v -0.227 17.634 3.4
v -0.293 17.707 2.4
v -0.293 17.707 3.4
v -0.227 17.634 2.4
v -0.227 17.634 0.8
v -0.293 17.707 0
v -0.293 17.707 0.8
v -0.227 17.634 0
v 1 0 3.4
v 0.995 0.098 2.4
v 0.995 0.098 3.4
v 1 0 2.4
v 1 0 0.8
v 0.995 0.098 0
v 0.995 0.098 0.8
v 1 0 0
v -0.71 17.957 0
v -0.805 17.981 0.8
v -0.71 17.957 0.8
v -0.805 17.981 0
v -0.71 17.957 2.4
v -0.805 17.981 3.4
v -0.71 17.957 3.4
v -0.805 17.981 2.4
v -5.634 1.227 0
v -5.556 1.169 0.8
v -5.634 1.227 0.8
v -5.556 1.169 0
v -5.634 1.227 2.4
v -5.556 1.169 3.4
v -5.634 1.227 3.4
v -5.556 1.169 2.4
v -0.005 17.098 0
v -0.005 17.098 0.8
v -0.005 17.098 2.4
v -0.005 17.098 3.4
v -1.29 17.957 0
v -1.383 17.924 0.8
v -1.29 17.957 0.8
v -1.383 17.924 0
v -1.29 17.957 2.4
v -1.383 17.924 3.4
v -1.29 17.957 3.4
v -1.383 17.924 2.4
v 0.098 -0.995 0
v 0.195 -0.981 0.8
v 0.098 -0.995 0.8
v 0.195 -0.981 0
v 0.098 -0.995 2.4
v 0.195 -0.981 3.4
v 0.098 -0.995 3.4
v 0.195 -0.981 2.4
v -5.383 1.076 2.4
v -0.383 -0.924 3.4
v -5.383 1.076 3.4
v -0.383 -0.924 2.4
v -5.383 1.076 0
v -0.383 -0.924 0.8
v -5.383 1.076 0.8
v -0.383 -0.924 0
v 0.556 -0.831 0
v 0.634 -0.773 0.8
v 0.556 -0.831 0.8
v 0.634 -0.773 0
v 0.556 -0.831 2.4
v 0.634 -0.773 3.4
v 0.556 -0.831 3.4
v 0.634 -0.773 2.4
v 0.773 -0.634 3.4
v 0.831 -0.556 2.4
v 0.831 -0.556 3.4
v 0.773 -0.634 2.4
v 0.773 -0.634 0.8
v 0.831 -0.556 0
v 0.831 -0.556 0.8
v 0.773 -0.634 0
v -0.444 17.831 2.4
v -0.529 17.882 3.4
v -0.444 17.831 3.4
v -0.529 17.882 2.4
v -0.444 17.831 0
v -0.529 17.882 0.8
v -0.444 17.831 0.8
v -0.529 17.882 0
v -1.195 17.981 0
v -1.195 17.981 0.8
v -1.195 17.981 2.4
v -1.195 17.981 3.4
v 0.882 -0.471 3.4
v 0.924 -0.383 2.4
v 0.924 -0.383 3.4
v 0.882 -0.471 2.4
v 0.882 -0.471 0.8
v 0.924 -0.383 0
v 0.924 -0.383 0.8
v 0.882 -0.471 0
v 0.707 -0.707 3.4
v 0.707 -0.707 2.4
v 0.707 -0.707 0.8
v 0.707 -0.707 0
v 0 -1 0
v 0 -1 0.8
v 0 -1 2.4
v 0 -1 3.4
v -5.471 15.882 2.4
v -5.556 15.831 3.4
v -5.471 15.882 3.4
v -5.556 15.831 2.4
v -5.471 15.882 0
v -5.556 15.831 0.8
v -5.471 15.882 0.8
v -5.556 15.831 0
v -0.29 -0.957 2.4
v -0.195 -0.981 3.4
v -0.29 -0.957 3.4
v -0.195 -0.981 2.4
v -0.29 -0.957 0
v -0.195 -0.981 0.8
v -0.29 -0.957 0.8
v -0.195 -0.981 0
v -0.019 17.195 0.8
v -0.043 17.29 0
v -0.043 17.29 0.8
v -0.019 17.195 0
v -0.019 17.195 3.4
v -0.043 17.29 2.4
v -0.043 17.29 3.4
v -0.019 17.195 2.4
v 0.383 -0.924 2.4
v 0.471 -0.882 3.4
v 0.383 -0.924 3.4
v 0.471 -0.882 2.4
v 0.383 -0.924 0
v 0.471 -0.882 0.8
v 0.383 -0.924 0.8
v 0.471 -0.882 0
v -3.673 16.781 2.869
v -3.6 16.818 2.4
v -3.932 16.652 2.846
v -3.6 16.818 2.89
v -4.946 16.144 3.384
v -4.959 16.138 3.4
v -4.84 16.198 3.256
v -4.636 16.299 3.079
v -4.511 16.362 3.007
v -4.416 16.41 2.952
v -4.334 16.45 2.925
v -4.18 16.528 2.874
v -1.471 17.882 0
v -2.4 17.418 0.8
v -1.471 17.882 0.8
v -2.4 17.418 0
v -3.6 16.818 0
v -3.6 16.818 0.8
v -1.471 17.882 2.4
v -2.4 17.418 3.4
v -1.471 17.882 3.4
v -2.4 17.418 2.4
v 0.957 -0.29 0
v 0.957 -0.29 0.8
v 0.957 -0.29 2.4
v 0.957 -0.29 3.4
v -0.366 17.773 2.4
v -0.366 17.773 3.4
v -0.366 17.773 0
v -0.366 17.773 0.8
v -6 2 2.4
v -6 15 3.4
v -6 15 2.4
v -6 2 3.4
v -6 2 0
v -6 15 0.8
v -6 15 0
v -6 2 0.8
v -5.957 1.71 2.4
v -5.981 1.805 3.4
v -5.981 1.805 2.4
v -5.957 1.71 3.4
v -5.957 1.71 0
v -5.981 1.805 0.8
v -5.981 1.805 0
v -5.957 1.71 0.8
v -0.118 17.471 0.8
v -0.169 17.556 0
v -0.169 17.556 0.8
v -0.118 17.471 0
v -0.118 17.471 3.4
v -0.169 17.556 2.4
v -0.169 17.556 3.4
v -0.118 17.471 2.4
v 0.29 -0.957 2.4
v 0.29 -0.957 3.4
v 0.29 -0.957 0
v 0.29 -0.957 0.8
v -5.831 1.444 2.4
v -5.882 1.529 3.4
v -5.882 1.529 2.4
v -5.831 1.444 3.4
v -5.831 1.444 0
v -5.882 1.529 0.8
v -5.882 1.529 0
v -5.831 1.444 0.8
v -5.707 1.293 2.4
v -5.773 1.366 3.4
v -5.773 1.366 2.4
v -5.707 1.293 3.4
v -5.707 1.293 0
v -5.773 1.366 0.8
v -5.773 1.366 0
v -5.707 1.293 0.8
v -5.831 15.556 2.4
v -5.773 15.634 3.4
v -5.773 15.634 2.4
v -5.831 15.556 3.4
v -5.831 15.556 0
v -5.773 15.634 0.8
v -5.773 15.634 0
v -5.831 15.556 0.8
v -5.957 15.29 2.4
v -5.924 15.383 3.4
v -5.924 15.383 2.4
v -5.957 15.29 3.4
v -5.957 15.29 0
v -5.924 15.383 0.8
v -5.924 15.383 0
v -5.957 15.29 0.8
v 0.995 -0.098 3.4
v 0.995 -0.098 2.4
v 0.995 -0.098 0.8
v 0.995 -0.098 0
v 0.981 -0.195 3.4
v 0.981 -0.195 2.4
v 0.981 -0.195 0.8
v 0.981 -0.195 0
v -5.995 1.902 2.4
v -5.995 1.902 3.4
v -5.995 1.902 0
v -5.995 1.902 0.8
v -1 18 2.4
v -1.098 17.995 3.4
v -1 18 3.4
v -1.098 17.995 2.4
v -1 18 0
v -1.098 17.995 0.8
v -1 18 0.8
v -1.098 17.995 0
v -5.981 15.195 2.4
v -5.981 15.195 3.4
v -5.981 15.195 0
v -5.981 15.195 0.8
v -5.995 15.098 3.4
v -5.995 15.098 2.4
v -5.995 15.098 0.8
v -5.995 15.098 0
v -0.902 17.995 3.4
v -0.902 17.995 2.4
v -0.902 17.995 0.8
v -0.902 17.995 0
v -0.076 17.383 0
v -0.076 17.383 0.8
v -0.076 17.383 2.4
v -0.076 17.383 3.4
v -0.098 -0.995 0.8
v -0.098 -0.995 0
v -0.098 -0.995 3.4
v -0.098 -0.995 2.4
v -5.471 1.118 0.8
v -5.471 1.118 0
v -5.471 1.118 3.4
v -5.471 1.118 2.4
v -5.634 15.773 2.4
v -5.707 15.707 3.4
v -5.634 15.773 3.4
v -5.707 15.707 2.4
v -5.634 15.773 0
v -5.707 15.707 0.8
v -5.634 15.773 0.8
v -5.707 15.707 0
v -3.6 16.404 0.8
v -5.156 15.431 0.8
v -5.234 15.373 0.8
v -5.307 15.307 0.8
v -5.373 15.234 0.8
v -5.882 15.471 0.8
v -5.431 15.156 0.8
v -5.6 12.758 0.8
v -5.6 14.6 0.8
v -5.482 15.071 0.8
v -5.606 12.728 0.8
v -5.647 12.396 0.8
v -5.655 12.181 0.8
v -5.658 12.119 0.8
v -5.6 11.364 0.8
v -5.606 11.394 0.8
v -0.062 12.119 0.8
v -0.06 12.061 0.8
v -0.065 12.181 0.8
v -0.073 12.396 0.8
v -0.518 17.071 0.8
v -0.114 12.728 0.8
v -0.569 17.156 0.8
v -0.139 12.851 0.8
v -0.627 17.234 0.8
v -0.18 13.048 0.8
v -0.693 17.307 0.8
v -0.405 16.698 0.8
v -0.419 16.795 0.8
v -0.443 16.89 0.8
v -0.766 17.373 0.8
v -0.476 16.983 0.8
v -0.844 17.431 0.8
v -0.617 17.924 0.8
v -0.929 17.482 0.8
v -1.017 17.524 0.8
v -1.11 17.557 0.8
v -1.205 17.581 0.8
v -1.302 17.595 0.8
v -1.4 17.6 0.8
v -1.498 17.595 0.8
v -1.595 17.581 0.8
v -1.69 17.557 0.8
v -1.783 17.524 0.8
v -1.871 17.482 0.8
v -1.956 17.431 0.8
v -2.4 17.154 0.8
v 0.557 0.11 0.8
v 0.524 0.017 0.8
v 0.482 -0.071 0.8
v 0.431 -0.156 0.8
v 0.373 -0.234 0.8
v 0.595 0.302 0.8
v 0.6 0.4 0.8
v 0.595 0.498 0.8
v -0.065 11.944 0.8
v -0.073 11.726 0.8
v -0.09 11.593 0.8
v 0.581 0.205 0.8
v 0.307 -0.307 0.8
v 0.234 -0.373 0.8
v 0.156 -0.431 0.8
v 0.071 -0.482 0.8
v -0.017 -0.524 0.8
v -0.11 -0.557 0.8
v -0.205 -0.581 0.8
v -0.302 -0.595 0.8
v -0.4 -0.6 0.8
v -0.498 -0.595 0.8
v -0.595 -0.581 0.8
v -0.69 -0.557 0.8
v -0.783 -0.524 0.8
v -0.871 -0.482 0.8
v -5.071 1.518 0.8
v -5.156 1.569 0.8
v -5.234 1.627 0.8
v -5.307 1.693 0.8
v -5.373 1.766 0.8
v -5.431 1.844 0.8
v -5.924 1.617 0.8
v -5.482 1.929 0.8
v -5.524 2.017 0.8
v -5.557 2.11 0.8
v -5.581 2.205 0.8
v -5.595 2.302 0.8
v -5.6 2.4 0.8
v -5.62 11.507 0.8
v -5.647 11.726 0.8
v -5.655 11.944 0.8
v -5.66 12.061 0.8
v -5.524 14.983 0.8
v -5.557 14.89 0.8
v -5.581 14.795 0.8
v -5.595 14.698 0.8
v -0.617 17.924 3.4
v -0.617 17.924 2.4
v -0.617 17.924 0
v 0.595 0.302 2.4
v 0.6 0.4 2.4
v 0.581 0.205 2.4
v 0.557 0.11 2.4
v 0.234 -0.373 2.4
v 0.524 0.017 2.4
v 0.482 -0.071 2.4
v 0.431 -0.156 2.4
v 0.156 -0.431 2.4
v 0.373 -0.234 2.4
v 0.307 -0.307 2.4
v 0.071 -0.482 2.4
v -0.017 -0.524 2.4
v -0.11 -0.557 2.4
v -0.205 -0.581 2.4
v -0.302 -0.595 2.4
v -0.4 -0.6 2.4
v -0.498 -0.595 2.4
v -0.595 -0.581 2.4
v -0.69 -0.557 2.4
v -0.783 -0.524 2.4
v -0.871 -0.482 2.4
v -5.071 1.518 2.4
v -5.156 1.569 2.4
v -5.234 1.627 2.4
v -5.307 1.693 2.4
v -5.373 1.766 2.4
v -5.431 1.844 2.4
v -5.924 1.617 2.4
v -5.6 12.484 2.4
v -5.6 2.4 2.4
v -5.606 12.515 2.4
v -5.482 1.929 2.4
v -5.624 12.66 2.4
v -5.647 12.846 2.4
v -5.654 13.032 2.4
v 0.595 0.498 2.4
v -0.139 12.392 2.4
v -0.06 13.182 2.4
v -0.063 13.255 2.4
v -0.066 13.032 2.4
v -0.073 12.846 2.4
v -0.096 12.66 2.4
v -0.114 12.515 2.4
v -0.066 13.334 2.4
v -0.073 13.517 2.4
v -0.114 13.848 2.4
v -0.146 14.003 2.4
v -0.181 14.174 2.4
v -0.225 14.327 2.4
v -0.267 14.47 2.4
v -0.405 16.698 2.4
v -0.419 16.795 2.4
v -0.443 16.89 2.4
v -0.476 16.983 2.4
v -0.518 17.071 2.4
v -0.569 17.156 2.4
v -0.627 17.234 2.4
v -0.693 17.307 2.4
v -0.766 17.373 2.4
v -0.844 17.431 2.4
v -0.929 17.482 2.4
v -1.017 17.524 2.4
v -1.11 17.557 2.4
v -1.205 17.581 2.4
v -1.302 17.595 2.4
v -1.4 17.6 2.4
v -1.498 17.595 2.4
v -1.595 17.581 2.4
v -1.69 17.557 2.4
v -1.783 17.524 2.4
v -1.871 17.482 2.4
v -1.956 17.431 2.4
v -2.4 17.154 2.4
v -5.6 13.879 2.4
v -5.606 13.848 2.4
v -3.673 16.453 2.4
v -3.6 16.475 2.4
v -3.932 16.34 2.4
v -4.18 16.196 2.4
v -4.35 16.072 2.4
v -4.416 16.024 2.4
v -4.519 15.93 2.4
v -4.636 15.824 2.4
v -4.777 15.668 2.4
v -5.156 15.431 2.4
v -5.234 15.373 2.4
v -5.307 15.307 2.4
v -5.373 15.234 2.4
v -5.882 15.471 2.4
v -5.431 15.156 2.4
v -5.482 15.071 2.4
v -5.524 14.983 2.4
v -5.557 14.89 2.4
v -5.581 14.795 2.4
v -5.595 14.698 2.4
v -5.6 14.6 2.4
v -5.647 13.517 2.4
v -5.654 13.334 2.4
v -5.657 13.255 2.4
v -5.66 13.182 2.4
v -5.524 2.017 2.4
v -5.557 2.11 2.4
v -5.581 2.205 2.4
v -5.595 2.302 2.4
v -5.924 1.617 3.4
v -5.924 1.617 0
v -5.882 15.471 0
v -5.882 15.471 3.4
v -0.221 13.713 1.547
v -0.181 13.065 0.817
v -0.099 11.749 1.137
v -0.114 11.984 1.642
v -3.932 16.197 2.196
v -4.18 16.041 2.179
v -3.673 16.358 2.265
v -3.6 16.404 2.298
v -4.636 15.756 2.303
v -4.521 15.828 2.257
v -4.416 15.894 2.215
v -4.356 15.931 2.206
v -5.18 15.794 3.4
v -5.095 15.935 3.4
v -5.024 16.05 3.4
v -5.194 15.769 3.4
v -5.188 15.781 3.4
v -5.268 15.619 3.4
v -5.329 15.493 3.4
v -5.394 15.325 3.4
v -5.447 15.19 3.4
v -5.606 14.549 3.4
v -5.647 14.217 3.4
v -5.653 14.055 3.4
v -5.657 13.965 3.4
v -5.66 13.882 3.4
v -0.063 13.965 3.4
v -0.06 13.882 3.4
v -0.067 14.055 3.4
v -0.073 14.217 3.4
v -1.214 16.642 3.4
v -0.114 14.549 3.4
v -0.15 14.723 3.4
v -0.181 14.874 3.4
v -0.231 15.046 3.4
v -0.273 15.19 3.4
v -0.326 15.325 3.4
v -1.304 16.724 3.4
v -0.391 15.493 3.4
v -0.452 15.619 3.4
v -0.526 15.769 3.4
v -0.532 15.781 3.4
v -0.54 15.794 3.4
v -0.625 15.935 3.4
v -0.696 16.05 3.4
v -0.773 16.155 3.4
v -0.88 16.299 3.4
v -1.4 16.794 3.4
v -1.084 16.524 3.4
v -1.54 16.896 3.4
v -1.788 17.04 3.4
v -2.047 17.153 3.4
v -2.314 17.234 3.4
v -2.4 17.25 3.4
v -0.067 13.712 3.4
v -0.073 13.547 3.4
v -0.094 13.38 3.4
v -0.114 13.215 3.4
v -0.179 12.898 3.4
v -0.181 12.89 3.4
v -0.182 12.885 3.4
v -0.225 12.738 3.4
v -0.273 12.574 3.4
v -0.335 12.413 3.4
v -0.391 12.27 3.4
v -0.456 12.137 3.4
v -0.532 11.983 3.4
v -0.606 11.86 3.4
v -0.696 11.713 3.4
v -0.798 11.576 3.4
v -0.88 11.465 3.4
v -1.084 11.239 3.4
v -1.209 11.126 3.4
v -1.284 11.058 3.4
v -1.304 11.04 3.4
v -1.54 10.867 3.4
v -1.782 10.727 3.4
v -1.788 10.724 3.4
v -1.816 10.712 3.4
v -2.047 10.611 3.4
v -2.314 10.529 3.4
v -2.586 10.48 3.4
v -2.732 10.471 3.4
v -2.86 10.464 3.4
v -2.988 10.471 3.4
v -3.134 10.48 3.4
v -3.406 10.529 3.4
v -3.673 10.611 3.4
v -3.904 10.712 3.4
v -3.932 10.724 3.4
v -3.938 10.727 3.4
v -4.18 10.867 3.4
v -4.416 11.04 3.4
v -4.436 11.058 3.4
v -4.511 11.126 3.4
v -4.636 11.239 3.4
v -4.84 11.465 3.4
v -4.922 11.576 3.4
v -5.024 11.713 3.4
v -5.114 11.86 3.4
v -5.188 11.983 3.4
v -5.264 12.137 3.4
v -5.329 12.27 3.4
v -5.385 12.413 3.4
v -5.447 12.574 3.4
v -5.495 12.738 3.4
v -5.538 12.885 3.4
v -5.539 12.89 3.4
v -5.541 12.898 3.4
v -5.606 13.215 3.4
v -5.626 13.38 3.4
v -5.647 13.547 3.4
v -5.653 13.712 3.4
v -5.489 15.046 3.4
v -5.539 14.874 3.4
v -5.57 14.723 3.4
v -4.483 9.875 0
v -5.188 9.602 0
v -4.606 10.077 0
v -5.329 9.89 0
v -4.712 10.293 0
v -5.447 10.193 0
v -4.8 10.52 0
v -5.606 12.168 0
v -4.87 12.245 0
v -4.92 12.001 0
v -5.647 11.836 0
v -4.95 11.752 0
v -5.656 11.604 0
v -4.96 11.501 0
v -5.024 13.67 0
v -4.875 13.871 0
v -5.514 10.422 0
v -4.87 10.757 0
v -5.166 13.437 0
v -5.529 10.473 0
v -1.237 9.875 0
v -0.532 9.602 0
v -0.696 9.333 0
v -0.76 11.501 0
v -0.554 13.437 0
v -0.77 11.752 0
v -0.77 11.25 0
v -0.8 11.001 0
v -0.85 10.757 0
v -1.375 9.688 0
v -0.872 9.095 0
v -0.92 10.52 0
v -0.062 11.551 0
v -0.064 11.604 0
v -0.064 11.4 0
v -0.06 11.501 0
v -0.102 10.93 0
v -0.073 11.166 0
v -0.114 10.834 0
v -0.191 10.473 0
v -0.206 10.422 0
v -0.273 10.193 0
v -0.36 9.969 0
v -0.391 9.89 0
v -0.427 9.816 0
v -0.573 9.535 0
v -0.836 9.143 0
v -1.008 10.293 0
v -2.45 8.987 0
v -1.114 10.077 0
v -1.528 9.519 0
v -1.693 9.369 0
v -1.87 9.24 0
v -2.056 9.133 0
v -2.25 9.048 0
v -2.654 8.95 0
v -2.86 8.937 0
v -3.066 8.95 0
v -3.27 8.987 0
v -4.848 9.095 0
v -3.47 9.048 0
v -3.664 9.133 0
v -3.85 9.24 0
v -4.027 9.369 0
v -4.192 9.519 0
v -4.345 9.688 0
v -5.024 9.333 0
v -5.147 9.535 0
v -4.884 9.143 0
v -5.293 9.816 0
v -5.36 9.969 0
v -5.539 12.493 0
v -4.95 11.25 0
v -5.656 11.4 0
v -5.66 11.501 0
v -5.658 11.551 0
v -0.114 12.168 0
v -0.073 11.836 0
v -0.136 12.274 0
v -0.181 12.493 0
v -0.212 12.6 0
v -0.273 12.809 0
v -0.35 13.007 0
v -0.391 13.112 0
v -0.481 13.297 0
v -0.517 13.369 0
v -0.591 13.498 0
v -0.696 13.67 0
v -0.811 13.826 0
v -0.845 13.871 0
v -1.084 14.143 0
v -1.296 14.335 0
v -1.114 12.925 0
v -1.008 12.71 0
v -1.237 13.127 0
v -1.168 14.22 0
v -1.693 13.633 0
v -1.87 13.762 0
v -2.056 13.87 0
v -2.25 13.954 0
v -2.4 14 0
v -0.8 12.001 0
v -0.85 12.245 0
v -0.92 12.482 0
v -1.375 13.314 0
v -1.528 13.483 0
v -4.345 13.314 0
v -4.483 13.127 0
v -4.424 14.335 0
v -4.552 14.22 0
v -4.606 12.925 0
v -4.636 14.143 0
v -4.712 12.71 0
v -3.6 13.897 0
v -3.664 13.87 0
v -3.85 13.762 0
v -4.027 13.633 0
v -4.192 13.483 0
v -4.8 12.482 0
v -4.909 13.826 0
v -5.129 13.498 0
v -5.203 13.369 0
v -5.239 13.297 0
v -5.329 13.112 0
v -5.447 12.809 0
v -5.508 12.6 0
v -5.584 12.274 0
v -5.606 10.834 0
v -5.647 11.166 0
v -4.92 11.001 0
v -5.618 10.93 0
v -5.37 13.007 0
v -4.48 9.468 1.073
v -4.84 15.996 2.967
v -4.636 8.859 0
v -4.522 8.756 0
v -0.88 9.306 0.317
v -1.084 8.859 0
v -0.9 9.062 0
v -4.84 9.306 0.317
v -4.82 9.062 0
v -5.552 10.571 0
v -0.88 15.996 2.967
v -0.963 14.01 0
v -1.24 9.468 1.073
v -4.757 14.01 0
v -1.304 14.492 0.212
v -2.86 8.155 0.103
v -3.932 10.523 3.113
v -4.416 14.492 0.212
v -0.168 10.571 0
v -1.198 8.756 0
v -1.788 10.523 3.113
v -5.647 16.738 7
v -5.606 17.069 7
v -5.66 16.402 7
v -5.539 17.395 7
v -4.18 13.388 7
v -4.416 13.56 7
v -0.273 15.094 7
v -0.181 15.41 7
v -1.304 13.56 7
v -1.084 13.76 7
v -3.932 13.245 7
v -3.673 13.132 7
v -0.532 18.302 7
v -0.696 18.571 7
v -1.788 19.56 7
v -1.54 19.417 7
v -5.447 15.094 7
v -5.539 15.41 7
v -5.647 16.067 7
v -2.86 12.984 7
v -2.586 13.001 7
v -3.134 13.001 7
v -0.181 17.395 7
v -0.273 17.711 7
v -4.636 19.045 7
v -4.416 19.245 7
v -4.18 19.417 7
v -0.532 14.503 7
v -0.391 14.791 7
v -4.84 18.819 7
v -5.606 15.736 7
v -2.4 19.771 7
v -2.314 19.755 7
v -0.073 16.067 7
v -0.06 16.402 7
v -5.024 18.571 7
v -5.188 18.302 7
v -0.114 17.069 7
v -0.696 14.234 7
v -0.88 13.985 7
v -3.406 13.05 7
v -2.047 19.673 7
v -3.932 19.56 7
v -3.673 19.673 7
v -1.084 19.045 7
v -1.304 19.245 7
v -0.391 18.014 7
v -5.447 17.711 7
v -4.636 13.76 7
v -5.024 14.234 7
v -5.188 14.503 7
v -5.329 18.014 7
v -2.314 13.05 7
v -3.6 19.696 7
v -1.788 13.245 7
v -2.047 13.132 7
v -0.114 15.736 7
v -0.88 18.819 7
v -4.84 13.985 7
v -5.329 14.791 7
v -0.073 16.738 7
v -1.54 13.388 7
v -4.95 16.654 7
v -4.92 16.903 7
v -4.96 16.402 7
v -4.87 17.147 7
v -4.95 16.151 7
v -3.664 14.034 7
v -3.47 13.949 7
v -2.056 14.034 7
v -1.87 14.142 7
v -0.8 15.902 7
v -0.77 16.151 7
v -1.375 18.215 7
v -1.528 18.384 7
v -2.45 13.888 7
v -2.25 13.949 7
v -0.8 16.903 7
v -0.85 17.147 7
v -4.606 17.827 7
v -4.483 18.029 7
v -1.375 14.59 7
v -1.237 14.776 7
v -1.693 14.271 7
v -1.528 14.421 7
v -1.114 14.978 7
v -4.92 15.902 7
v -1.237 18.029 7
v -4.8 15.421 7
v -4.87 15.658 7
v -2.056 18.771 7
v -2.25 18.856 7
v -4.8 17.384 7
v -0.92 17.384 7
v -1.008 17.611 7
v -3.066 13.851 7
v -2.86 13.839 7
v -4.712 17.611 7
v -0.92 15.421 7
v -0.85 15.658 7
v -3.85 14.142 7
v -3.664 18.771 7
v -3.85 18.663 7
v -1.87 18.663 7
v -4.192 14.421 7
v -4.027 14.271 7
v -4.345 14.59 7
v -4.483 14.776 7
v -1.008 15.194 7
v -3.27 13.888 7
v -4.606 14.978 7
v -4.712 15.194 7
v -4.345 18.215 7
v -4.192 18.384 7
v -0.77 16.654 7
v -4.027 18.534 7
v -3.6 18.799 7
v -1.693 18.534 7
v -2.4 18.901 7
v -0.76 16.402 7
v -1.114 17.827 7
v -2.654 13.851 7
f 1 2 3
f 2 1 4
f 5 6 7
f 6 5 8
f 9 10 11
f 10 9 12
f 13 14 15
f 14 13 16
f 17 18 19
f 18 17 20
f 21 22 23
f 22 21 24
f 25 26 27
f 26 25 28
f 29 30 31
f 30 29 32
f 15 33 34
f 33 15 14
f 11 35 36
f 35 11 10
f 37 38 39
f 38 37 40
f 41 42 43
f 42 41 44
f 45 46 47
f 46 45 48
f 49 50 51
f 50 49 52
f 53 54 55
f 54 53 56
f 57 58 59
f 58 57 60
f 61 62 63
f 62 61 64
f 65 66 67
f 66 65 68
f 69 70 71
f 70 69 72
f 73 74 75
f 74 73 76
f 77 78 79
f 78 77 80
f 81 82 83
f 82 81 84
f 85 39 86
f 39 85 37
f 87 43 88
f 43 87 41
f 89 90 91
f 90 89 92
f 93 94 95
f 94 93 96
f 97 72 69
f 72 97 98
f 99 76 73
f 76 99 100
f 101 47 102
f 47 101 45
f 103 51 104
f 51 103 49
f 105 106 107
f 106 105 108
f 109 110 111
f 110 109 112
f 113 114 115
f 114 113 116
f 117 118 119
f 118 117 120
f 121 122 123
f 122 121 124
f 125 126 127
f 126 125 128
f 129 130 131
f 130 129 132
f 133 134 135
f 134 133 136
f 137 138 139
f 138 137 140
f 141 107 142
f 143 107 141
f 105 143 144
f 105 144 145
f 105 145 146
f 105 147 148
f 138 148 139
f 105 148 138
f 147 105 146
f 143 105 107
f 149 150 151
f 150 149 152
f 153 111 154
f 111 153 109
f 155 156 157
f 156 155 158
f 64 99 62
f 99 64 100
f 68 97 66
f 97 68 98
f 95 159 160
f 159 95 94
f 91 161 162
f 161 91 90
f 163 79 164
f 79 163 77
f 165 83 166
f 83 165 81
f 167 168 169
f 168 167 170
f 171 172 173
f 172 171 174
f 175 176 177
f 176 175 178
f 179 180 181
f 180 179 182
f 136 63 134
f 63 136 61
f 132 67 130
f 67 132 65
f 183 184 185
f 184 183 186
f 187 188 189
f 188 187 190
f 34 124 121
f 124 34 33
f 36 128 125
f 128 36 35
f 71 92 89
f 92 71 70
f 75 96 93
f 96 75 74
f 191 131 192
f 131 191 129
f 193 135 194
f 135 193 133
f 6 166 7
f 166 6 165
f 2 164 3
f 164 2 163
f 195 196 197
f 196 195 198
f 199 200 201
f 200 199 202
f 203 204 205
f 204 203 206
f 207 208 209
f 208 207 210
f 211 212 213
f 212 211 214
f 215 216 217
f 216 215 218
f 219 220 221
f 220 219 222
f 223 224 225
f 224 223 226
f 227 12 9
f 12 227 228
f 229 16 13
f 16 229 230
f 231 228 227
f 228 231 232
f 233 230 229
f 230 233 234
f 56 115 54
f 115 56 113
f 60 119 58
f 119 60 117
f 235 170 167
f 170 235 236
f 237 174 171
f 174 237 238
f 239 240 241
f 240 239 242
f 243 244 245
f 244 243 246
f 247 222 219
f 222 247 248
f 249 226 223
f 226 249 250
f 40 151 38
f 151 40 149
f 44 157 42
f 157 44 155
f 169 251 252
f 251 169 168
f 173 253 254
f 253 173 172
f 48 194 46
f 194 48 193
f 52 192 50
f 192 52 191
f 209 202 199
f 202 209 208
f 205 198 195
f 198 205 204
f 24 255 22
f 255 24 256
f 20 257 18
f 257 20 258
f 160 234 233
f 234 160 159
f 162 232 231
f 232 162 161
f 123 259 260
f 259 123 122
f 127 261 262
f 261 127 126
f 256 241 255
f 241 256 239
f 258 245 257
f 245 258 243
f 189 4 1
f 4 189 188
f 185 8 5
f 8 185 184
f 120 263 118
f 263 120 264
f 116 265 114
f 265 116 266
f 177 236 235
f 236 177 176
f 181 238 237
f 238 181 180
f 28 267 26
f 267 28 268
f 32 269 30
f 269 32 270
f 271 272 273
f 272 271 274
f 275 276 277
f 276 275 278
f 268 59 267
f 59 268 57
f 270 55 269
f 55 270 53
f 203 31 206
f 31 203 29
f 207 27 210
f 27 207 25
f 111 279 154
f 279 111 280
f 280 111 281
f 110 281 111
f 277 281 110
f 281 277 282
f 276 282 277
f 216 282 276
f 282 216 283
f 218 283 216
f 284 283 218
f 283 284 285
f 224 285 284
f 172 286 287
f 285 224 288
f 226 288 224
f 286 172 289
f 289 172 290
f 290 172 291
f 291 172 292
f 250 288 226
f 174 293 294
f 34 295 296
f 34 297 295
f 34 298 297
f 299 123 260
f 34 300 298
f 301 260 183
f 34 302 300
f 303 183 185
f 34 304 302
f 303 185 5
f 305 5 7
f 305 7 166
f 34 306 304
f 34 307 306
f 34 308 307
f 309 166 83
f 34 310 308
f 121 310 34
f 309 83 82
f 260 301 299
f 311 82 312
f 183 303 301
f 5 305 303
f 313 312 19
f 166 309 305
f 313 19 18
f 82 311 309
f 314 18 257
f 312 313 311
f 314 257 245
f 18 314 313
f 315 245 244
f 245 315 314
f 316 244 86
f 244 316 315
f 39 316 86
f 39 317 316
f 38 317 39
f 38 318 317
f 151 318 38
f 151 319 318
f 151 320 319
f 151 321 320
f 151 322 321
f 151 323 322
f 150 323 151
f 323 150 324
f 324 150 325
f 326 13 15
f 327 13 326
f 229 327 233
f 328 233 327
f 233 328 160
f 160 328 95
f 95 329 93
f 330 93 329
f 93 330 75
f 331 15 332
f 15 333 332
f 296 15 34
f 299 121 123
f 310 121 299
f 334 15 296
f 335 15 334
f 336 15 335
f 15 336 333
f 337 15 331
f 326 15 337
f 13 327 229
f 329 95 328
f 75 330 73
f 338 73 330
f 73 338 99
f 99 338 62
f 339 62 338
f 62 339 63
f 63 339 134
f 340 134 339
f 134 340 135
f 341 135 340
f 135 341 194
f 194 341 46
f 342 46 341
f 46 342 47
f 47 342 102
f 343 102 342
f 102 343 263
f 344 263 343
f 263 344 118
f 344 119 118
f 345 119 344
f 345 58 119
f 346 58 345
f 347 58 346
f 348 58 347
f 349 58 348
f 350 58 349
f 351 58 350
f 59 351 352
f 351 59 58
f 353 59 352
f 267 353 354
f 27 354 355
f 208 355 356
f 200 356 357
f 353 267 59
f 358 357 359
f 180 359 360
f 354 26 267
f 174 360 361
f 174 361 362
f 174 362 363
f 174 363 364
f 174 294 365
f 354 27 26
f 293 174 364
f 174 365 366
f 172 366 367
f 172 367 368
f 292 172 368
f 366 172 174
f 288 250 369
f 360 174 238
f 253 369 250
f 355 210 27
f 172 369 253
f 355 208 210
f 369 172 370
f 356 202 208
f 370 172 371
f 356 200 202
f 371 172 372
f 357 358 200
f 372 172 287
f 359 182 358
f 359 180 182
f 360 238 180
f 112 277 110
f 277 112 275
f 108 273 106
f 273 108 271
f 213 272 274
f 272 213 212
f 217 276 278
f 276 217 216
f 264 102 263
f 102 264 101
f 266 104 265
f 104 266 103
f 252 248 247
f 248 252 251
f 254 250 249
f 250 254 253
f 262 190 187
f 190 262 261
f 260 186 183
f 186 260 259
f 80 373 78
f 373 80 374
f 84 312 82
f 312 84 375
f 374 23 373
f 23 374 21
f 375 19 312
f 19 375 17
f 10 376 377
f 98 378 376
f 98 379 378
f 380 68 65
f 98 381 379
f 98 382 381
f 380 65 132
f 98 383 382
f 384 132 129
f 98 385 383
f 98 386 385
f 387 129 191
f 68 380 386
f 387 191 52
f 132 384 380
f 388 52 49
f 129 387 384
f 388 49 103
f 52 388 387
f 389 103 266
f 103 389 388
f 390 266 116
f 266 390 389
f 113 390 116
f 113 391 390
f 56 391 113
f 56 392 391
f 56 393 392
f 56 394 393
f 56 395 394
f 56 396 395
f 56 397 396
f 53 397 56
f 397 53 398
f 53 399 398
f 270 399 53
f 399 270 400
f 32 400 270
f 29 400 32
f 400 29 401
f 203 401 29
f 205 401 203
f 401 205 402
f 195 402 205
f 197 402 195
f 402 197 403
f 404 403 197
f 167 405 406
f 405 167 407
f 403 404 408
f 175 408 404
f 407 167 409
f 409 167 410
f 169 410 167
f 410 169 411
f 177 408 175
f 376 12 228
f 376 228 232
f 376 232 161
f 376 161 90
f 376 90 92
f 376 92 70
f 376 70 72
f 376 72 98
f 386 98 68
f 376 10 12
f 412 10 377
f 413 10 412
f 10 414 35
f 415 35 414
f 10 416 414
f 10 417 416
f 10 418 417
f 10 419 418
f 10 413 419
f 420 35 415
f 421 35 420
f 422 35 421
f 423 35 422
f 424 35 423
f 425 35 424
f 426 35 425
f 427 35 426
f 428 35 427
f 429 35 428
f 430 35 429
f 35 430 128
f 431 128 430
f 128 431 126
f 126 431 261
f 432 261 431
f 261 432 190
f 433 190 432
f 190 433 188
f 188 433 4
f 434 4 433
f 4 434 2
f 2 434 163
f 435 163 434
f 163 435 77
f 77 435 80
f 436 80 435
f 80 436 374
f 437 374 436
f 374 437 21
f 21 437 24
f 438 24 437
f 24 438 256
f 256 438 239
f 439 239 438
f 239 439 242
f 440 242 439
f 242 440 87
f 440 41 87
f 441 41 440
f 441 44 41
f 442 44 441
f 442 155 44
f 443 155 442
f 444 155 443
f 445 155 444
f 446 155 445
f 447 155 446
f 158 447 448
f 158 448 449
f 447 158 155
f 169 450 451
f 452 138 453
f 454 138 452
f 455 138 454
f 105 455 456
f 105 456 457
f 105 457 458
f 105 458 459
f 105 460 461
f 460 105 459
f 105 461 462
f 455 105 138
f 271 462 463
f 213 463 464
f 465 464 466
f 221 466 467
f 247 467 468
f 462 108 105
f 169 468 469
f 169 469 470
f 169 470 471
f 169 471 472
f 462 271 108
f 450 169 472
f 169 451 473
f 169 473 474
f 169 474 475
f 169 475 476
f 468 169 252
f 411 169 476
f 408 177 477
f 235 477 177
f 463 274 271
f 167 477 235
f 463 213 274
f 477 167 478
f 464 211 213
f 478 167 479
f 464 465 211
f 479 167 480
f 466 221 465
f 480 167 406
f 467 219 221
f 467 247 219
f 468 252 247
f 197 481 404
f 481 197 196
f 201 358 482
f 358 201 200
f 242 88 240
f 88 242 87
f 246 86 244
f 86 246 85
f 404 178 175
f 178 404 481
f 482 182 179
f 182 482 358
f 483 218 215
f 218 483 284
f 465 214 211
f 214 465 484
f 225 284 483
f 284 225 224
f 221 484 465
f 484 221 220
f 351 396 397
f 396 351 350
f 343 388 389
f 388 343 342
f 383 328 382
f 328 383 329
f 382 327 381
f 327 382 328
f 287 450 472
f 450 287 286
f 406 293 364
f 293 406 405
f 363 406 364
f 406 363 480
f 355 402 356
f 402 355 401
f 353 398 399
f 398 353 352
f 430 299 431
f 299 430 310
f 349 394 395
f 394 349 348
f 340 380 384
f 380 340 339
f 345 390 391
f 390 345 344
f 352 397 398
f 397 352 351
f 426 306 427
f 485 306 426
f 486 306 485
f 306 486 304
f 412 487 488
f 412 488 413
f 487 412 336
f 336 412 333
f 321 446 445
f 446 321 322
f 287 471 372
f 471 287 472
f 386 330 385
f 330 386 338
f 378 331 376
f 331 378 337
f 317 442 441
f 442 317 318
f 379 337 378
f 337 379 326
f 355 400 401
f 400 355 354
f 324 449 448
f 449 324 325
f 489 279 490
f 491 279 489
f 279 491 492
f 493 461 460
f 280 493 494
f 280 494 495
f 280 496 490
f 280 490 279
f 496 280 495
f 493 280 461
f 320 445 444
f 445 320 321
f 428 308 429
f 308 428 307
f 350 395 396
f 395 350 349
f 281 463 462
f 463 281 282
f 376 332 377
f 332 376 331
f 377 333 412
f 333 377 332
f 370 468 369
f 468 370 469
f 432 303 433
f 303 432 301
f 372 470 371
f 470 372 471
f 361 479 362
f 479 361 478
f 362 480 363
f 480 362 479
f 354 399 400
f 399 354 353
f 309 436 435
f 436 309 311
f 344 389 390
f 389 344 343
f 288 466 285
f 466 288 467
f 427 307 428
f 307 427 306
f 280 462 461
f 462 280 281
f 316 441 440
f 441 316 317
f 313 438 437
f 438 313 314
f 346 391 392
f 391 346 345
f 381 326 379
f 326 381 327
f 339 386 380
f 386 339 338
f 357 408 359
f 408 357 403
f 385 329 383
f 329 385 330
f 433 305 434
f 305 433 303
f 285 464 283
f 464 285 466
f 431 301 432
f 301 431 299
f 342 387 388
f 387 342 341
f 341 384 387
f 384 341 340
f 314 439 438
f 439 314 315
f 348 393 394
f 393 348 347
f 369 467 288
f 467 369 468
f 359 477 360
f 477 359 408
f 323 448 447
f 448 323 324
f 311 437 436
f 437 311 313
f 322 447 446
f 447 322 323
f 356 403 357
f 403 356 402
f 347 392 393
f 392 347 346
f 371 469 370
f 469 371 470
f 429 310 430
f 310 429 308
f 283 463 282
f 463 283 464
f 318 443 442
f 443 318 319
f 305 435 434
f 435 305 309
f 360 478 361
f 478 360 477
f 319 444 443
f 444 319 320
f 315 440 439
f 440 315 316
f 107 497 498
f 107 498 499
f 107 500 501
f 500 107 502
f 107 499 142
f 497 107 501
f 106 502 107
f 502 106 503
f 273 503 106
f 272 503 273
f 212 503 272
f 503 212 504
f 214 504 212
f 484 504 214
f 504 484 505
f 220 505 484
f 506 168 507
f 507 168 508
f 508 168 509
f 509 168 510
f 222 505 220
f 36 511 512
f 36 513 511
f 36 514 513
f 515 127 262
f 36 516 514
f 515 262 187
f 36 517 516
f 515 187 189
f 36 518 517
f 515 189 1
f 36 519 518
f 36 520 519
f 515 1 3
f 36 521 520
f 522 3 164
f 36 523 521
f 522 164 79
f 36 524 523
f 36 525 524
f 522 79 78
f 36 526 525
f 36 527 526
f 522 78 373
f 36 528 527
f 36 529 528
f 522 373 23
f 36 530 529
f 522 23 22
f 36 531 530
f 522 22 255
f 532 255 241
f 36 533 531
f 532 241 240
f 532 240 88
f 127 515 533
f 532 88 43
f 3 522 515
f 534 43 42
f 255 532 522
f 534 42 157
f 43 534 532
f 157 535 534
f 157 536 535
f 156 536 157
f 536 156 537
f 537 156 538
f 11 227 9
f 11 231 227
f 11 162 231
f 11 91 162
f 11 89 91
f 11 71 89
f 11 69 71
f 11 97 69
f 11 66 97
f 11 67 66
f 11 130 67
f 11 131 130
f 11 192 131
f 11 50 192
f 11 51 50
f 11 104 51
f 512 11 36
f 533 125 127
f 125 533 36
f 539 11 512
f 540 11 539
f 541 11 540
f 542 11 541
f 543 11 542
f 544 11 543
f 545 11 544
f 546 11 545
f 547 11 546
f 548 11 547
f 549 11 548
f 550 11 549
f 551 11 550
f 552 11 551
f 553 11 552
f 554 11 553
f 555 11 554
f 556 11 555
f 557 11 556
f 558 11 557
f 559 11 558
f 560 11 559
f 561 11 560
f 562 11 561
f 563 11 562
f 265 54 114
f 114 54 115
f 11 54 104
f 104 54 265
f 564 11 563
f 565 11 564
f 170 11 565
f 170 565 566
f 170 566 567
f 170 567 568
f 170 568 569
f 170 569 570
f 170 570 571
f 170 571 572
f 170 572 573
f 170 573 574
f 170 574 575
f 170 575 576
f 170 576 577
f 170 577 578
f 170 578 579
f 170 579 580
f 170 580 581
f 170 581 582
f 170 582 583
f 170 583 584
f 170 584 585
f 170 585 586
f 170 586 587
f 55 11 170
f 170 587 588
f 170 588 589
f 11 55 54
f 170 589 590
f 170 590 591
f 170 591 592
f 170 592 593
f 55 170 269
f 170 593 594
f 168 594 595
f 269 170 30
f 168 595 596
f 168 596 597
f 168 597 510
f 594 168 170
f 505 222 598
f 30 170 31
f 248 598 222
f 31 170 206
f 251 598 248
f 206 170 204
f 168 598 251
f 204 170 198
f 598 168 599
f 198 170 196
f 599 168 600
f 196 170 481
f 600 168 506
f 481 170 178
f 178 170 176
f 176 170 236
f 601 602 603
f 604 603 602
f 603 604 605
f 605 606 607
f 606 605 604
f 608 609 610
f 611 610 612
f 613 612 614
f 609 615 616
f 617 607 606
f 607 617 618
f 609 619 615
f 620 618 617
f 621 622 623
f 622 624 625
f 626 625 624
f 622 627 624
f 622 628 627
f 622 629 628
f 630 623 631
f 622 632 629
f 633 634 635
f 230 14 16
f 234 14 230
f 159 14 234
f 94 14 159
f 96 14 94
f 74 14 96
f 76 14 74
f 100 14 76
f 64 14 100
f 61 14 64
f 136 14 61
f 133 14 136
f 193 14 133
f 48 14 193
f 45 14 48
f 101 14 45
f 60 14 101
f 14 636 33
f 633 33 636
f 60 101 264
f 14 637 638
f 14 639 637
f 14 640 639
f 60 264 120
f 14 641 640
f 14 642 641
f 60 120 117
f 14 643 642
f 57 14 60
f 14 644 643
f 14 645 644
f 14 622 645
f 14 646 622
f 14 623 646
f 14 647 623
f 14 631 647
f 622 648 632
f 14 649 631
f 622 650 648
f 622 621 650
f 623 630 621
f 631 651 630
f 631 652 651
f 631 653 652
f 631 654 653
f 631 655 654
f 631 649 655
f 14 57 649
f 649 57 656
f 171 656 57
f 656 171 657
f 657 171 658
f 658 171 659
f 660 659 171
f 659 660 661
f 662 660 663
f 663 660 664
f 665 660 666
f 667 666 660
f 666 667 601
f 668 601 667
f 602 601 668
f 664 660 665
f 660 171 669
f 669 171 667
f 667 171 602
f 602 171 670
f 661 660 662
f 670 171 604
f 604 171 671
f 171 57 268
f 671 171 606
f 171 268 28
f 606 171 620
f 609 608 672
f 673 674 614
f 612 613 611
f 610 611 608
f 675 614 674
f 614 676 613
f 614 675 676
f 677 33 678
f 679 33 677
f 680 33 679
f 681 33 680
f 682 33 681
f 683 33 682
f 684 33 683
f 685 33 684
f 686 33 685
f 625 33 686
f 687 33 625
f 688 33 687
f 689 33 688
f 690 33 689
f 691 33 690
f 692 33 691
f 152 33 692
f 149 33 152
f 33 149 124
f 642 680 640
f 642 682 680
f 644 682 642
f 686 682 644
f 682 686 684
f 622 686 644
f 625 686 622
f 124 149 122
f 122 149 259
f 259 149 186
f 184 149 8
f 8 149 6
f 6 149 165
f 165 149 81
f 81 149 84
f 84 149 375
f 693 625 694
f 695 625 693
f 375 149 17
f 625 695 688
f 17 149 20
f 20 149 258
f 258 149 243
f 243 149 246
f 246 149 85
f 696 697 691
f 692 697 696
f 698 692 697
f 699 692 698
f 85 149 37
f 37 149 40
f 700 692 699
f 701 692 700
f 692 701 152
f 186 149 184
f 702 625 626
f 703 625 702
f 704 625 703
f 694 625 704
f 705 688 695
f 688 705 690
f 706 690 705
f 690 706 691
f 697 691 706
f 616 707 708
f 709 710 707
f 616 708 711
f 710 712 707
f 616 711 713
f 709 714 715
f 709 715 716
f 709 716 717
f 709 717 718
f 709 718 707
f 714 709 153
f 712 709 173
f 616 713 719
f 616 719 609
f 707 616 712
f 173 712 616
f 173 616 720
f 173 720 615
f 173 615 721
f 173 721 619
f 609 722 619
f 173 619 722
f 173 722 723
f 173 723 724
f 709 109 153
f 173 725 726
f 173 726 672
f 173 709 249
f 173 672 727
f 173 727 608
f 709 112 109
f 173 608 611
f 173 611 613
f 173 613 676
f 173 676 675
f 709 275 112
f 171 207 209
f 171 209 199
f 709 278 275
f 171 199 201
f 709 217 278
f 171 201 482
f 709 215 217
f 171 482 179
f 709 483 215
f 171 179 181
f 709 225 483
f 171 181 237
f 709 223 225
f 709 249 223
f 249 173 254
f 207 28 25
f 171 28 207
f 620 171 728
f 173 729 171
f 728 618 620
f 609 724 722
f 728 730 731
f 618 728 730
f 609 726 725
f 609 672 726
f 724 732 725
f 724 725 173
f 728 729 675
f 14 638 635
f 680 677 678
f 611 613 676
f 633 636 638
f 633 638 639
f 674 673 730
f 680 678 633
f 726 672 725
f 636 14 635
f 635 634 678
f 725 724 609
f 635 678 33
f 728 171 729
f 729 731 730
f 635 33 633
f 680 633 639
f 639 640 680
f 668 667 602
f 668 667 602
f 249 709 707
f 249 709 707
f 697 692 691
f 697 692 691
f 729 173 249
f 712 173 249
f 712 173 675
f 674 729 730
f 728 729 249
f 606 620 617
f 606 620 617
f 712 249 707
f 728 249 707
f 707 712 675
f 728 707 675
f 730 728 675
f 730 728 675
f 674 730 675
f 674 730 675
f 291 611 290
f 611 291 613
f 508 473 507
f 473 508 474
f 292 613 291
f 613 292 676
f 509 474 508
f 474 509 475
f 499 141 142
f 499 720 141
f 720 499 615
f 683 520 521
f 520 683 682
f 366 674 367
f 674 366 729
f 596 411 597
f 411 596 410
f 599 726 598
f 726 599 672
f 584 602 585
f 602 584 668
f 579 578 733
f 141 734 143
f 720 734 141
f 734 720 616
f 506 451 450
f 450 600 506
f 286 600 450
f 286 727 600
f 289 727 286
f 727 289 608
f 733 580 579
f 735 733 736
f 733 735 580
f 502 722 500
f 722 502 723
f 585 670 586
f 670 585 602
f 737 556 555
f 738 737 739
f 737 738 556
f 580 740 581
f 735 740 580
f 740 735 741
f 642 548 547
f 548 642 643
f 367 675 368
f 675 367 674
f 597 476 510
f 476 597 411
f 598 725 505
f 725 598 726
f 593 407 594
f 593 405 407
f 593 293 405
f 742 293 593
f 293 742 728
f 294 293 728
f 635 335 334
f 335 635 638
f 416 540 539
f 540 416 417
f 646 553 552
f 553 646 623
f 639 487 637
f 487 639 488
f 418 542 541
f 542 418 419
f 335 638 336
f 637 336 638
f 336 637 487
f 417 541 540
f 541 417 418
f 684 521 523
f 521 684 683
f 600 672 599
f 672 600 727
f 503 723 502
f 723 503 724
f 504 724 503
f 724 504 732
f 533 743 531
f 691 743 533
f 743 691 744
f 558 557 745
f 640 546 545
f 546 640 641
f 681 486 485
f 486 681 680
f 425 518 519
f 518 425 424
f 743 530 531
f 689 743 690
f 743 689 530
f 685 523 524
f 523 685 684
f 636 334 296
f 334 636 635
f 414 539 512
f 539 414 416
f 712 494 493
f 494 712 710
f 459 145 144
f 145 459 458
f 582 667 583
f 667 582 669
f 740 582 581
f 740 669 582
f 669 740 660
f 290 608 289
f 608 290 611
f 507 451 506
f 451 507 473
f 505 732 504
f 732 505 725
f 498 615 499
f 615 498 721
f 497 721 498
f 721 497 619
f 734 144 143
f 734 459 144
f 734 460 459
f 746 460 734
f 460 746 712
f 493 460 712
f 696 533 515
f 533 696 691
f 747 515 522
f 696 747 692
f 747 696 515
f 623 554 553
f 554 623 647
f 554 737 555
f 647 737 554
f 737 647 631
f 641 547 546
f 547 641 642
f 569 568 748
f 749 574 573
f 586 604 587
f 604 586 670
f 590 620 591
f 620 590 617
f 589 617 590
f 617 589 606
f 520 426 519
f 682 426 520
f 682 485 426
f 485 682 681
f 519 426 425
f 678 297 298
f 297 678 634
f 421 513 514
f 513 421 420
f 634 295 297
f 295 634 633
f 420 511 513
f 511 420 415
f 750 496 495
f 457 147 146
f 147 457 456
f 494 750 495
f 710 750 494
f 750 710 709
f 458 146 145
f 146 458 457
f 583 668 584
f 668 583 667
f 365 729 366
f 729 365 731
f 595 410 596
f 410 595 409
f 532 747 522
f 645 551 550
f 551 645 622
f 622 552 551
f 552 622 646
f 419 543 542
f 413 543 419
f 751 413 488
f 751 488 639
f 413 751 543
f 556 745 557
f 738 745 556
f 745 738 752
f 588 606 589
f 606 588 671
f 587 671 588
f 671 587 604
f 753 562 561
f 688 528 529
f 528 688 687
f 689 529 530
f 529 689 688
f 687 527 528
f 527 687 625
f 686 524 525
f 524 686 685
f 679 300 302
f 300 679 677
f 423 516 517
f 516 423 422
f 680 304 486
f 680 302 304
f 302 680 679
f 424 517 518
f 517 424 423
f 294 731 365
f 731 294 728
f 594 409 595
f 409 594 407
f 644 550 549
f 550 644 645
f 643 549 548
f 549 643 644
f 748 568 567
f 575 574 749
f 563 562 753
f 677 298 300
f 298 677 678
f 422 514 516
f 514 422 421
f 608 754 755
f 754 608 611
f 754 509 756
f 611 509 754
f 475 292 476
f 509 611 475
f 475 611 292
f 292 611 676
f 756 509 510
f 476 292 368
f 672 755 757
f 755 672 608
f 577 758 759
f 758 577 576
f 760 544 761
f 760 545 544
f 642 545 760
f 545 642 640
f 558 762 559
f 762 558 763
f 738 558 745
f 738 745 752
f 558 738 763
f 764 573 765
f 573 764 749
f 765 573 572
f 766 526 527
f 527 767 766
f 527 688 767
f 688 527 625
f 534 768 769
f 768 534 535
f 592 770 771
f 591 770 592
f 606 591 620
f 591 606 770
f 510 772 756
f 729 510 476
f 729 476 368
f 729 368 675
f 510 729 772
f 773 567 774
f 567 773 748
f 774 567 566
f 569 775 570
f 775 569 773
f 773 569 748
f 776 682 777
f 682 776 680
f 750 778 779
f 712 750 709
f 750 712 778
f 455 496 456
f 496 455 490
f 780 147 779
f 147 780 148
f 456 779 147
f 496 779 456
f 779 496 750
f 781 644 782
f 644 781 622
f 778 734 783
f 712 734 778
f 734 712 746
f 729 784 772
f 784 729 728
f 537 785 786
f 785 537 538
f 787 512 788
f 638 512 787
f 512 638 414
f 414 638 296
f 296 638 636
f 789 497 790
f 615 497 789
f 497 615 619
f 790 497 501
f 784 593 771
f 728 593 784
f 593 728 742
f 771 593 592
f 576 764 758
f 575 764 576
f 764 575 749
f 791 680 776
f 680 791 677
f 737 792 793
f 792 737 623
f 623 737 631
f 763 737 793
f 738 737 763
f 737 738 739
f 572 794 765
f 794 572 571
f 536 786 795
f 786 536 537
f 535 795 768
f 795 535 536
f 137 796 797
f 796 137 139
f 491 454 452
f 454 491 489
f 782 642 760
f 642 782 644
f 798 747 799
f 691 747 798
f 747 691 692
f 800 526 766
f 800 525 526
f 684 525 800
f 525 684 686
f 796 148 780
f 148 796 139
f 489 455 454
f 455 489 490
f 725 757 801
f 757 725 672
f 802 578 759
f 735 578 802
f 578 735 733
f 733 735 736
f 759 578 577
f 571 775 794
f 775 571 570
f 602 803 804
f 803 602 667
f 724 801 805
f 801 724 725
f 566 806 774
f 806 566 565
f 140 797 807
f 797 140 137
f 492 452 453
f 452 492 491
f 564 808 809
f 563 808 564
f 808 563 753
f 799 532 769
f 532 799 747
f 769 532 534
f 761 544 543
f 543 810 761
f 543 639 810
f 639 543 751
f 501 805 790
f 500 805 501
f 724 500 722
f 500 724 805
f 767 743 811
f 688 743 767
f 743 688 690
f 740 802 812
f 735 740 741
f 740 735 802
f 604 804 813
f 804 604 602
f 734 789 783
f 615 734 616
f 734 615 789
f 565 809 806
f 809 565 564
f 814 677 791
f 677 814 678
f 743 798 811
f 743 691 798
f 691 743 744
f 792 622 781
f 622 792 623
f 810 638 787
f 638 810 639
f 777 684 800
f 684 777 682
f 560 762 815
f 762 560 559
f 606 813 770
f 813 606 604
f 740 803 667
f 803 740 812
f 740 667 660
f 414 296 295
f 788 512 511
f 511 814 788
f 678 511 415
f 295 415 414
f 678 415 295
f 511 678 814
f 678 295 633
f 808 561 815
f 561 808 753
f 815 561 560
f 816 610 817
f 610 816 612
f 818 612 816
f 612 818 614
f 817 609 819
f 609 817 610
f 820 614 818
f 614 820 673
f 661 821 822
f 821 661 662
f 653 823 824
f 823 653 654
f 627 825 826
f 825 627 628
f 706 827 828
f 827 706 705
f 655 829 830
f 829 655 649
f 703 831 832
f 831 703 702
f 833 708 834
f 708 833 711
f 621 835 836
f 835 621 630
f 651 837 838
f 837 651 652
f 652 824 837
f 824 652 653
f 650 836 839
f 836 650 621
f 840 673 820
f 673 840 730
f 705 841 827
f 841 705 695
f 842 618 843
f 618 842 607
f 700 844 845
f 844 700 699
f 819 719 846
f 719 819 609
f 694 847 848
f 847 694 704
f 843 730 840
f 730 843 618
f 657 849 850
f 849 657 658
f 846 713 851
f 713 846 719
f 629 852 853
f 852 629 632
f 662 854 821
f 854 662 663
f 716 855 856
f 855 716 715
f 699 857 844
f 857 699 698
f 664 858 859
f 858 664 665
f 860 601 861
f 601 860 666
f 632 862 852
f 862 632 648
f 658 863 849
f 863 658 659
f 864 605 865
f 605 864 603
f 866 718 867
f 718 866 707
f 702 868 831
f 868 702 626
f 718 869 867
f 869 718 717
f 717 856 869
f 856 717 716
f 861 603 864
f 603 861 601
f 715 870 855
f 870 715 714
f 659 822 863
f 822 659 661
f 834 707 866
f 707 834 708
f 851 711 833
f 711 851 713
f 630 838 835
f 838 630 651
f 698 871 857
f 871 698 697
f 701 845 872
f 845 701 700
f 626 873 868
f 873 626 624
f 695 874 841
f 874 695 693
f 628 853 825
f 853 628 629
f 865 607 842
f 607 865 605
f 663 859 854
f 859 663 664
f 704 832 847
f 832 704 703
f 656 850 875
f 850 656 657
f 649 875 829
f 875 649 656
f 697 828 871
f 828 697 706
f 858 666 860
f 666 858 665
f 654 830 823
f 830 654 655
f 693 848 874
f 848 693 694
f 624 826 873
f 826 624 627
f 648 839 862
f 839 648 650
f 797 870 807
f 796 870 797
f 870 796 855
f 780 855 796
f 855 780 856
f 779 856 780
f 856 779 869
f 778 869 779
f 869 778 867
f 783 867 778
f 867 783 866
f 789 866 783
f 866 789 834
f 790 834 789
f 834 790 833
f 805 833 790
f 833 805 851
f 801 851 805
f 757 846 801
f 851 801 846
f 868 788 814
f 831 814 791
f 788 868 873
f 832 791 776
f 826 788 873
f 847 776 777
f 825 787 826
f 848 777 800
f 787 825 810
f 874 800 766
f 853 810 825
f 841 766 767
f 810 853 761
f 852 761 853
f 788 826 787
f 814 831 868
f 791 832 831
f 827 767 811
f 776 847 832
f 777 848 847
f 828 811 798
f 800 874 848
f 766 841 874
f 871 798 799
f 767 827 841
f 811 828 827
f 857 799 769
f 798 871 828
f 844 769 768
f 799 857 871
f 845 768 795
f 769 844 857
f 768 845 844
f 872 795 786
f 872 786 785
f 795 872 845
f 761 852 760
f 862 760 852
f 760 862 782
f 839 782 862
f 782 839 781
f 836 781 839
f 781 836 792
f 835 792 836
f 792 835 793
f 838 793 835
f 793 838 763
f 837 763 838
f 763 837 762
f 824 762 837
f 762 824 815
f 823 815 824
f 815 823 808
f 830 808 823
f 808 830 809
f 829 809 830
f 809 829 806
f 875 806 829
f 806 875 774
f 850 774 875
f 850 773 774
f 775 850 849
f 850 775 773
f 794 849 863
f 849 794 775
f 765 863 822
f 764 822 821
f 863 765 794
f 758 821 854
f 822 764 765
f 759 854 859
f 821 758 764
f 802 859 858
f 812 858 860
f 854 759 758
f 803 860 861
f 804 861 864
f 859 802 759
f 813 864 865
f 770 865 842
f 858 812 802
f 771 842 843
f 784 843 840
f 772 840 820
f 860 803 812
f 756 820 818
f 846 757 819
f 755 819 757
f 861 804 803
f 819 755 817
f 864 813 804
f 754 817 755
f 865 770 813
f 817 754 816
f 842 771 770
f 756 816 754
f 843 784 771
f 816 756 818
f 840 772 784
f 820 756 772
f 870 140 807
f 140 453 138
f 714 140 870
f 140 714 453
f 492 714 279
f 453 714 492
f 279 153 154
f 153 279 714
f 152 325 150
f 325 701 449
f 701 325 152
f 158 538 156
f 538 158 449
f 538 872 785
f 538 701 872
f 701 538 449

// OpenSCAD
$fn = 64;
module plate(h = 3.4) {
  x1 = 1;
  x2 = 5;
  y1 = 17;
  y2 = 15;
  y3 = 2;
  ins = 1.6;
  difference() {
    hull() {
      translate([x2, y3, 0]) {
        cylinder(h = h, r = 1);
      }
      translate([x1, y1, 0]) {
        cylinder(h = h, r = 1);
      }
      translate([x2, y2, 0]) {
        cylinder(h = h, r = 1);
      }
      translate([0, 0, 0]) {
        cylinder(h = h, r = 1);
      }
    }
    shift = 0.4;
    translate([0, 0, 0.8]) {
      difference() {
        hull() {
          translate([x2, y3, 0]) {
            cylinder(h = ins, r = 1);
          }
          translate([x1, y1, 0]) {
            cylinder(h = ins, r = 1);
          }
          translate([x2, y2, 0]) {
            cylinder(h = ins, r = 1);
          }
          translate([0, 0, 0]) {
            cylinder(h = ins, r = 1);
          }
        }
        hull() {
          translate([x2 - shift, y3 + shift, 0]) {
            cylinder(h = ins, r = 1);
          }
          translate([x1 + shift, y1 - shift, 0]) {
            cylinder(h = ins, r = 1);
          }
          translate([x2 - shift, y2 - shift, 0]) {
            cylinder(h = ins, r = 1);
          }
          translate([shift, shift, 0]) {
            cylinder(h = ins, r = 1);
          }
        }
      }
    }
  }
}

angle = 35;

module standoff(cut = true) {
  translate([2.86, 8, -5]) {
    intersection() {
      rotate(angle, [-1, 0, 0]) {
        difference() {
          cylinder(h = 10 + 10, r = 2.8);
          if (cut) {
            cylinder(h = 10 + 20, r = 2.1);
          }
        }
      }

      translate([-5, -5, 5]) {
        cube([10, 20, 7]);
      }
    }
  }
}

mirror([1, 0, 0]) {
  difference() {
    union() {
      difference() {
        plate(h = 3.4);
        standoff(cut = false);
      }
      standoff();
    }
    translate([2.4, 12, 0]) {
      rotate(angle, [-1, 0, 0]) {
        cube([1.2, 5, 50]);
      }
    }
  }
}
